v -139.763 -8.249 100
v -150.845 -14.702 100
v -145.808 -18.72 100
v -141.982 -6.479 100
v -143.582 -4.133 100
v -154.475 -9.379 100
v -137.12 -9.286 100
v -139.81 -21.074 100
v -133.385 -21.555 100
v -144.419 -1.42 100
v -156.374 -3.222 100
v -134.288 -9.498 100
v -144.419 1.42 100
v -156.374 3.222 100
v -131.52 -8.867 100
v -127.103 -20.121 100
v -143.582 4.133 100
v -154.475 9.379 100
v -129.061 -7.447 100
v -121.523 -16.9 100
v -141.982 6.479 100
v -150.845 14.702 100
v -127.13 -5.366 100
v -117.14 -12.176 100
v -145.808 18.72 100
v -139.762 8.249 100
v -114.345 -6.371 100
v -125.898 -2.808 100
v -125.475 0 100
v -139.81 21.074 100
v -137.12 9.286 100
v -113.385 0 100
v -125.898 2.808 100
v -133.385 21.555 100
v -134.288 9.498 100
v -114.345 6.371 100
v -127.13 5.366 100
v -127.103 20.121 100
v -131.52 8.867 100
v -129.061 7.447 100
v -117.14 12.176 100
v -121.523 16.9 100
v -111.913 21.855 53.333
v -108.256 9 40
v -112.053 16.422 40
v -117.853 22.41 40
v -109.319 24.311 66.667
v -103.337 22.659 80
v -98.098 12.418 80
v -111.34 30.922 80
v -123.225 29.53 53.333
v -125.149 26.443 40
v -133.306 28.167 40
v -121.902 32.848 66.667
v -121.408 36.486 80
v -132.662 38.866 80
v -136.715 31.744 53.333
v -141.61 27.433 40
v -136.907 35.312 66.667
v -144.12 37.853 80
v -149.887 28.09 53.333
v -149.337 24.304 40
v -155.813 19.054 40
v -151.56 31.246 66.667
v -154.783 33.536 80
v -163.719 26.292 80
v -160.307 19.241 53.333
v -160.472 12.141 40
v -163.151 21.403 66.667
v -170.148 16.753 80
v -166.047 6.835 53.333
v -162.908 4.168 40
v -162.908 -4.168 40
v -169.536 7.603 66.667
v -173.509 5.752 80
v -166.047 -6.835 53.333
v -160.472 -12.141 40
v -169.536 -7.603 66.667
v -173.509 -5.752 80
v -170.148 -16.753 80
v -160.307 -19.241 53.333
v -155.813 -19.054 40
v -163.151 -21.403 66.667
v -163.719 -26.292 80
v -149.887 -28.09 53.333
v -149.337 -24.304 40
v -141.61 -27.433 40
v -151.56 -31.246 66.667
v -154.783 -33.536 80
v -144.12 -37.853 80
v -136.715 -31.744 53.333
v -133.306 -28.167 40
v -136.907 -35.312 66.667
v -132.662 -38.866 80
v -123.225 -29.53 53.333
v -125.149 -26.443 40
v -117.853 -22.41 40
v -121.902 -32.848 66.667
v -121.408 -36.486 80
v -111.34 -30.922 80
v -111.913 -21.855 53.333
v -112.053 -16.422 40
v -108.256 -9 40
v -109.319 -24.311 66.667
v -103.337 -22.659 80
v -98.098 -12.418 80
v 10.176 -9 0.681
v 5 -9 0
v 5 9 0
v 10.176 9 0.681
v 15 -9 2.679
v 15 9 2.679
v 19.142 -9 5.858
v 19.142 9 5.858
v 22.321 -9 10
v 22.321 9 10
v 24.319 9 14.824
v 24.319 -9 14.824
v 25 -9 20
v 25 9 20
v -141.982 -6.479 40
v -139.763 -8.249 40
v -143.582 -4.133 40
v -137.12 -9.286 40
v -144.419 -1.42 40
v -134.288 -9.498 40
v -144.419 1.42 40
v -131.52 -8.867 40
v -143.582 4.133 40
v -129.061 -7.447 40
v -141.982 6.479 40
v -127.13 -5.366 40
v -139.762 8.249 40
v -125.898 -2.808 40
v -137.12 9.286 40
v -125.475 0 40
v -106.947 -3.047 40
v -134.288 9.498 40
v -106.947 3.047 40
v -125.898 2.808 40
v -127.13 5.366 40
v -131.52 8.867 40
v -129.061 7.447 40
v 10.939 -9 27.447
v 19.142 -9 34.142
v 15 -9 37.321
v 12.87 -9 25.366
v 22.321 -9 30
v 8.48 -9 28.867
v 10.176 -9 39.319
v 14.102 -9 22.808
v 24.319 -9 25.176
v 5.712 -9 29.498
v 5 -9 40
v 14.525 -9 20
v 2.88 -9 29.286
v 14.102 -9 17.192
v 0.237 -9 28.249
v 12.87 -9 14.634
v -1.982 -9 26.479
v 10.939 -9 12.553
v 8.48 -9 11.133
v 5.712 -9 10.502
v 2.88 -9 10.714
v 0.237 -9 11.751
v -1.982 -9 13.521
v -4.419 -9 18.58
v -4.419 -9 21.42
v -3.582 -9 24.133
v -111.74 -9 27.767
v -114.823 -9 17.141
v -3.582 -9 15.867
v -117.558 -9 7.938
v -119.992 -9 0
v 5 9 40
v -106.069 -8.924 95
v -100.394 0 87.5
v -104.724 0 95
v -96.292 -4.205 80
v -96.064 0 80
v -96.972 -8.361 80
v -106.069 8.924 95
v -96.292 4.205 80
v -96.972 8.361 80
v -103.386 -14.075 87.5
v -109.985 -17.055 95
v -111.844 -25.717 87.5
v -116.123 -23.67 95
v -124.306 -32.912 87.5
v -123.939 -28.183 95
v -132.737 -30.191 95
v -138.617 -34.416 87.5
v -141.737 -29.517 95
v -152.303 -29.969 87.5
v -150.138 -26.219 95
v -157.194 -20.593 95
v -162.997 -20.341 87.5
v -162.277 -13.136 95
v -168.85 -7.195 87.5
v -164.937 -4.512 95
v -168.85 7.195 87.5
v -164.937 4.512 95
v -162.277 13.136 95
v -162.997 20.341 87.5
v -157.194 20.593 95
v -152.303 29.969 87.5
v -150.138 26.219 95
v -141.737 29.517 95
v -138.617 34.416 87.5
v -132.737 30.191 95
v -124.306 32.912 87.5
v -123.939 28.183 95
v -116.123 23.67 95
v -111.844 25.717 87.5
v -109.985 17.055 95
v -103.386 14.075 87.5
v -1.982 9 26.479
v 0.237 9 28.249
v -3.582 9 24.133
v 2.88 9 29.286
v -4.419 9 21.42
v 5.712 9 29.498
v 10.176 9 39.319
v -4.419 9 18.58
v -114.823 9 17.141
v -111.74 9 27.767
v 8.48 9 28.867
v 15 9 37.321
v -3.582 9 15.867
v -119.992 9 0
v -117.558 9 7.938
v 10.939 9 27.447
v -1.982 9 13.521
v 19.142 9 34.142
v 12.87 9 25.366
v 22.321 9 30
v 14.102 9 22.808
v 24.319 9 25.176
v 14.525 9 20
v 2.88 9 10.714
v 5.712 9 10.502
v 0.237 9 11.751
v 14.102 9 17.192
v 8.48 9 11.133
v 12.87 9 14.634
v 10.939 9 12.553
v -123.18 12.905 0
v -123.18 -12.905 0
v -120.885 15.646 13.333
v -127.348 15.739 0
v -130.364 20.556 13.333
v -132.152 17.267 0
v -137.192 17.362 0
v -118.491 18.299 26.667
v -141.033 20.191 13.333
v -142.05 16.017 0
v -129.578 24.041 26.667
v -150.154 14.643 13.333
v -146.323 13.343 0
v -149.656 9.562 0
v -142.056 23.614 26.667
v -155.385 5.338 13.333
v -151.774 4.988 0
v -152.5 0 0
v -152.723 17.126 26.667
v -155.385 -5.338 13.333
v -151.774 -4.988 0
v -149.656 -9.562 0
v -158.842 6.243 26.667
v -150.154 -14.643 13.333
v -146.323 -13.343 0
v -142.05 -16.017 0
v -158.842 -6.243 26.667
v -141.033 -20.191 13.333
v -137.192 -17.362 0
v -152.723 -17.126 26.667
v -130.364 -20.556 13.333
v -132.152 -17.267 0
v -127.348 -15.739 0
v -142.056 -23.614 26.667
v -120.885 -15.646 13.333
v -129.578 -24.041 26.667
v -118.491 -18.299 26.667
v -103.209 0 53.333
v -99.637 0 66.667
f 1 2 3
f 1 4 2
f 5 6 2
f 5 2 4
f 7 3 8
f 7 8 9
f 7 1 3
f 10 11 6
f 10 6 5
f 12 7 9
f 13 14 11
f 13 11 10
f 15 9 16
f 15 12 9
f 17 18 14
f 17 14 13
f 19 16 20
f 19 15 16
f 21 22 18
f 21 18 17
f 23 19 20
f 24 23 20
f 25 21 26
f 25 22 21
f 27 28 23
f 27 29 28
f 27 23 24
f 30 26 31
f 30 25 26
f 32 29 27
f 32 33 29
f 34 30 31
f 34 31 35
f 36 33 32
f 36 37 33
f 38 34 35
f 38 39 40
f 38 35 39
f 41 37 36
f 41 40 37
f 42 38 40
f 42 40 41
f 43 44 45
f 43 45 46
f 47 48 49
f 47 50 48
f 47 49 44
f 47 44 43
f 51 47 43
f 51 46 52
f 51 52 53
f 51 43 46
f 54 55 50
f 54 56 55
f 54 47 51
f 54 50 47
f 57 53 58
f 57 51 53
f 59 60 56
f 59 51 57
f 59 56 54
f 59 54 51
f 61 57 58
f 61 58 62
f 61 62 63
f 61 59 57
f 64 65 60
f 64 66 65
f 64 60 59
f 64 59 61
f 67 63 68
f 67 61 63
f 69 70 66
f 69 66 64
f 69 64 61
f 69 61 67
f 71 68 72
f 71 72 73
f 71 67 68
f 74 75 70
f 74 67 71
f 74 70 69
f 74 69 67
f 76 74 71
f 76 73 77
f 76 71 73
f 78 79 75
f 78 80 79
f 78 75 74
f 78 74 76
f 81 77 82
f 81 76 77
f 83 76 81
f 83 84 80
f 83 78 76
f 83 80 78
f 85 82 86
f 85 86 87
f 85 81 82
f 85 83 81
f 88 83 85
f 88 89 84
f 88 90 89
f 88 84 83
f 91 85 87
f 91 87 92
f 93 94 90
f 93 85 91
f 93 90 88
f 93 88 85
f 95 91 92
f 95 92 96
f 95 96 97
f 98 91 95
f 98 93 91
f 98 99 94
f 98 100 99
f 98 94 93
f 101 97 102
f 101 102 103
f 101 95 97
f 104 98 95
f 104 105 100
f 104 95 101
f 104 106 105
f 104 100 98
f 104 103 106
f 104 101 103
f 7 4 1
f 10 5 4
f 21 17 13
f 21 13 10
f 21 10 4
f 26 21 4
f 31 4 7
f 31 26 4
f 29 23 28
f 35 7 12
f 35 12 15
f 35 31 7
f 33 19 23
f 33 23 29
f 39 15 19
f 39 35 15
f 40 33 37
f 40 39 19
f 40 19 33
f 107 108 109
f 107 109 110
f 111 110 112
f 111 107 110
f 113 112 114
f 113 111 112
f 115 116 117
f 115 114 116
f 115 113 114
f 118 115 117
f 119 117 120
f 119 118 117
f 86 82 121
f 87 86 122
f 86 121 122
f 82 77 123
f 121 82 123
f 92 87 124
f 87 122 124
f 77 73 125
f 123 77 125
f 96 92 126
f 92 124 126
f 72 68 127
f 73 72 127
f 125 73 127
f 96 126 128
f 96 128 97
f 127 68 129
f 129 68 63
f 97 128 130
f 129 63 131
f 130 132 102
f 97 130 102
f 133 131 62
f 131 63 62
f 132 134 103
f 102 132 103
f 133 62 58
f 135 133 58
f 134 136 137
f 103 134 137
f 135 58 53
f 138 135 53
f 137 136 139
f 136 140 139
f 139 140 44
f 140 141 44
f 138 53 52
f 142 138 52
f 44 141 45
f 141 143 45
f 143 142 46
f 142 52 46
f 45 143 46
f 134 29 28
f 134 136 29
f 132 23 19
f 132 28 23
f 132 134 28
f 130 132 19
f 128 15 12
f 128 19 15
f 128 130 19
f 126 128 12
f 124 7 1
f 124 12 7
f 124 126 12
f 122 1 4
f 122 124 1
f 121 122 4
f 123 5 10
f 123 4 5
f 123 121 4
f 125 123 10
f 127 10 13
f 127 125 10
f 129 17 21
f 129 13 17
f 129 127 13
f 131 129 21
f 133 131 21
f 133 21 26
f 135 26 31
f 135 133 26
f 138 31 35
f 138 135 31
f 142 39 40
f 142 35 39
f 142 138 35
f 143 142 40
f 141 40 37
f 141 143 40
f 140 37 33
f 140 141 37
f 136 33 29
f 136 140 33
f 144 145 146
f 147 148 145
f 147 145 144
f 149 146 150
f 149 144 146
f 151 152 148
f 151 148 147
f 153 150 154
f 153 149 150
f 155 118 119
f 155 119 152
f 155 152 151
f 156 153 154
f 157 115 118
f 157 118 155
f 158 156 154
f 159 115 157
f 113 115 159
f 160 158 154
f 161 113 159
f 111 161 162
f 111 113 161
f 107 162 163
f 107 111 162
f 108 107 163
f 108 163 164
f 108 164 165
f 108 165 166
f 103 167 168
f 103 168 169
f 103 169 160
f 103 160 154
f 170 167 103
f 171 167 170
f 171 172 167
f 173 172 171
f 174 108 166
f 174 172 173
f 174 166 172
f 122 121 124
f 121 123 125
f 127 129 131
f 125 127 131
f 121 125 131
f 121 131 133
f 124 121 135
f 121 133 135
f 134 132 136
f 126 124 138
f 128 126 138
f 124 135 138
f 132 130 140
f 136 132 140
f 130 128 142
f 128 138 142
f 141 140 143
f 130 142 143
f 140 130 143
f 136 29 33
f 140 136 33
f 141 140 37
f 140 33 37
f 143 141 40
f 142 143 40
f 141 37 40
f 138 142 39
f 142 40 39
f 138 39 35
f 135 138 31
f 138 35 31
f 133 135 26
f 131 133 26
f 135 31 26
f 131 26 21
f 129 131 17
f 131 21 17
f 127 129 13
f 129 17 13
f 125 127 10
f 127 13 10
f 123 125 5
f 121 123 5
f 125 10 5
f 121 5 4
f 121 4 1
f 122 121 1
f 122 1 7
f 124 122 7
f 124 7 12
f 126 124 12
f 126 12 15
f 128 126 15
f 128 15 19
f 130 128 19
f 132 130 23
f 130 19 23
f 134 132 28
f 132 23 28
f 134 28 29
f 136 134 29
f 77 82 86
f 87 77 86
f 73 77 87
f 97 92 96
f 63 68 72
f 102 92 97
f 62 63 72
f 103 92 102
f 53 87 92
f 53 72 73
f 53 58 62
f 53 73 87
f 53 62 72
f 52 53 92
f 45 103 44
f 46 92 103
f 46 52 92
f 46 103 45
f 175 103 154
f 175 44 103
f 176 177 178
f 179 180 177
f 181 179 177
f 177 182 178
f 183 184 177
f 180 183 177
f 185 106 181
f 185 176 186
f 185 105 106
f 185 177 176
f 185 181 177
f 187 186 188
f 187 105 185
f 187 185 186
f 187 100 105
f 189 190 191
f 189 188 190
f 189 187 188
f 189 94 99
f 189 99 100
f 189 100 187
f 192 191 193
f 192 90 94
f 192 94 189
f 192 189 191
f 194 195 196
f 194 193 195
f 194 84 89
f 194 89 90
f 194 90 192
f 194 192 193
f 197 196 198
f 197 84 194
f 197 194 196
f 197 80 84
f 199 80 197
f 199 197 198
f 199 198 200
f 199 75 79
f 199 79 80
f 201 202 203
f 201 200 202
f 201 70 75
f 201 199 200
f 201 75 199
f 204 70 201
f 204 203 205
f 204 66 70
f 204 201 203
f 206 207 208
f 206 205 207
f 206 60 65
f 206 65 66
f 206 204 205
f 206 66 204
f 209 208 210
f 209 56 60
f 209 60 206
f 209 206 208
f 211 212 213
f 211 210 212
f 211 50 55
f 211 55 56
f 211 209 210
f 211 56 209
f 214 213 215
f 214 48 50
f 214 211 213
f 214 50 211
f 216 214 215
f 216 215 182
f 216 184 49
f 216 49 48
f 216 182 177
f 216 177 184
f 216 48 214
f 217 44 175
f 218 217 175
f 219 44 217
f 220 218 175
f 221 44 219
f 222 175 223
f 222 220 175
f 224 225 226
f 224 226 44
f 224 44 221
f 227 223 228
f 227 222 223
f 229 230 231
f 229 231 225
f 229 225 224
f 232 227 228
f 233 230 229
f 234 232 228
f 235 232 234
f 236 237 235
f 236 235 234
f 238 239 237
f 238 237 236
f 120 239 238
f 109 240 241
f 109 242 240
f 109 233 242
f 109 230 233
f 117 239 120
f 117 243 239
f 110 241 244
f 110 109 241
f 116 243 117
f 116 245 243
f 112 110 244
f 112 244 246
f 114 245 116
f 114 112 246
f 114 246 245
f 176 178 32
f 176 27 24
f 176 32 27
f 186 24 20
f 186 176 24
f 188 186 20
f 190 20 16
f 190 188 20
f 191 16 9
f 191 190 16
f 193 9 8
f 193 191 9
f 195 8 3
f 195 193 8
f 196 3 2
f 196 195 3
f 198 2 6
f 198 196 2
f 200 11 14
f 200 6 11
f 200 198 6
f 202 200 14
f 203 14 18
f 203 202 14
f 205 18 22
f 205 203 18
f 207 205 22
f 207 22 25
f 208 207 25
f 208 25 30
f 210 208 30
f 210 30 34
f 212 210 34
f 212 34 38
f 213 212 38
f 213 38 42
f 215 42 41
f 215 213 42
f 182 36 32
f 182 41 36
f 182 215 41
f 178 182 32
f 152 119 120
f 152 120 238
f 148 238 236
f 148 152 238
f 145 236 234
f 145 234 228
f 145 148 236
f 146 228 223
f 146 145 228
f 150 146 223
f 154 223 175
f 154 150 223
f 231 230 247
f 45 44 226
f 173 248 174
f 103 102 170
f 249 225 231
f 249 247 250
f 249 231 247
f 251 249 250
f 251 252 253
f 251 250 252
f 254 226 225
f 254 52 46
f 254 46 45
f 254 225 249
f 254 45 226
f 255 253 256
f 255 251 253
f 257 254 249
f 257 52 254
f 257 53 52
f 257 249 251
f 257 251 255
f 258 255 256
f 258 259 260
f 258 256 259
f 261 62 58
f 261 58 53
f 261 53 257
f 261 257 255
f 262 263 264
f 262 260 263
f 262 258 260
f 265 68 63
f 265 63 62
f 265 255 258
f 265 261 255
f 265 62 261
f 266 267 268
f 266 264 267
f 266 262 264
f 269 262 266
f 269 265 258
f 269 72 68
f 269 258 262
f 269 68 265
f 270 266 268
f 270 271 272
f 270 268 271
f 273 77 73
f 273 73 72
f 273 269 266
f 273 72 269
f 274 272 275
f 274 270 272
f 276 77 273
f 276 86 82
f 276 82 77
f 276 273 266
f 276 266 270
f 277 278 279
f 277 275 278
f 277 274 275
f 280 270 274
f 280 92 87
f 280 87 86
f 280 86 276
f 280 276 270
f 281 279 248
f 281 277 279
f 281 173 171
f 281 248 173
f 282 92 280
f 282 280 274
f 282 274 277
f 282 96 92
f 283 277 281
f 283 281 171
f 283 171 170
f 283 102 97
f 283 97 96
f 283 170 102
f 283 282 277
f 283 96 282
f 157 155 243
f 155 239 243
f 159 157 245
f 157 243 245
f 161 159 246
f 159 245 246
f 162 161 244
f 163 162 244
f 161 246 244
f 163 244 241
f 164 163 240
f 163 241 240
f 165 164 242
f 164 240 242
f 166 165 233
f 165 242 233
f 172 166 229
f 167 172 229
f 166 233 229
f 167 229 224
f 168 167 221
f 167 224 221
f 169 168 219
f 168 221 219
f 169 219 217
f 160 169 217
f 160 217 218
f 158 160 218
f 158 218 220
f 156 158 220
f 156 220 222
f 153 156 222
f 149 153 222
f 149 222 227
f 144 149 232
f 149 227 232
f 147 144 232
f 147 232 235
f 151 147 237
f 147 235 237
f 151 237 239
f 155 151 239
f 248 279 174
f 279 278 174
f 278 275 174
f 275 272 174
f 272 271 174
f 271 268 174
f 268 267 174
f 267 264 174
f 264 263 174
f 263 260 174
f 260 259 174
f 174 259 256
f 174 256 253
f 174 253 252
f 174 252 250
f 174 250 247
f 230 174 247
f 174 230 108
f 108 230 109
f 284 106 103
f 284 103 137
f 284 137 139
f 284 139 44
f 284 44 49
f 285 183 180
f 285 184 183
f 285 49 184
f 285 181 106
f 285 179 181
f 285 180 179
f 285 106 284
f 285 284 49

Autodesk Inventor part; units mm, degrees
ref_plane "YZ Plane" through (0, 0, 0) normal (1, 0, 0) x (0, 1, 0)
ref_plane "XZ Plane" through (0, 0, 0) normal (0, 1, 0) x (-1, 0, 0)
ref_plane "XY Plane" through (0, 0, 0) normal (0, 0, 1) x (1, 0, 0)
sketch "Sketch1" plane through (0, 0, 0) normal (0, 0, 1) x (1, 0, 0)
  line L0 (25, -9) -> (-135, -9)
  line L1 (-135, -9) -> (-135, 9)
  line L2 (-135, 9) -> (25, 9)
  line L3 (25, 9) -> (25, -9)
  circle A0 centre (-135, 0) radius 17.5
  point P0 (0, 0)
  dimension "d0" = 160
  dimension "d1" = 18
  dimension "d5" = 35
extrude "Extrusion1" add sketch "Sketch1" along normal blind 40 contours L0 A0 L2 L3 | L0 L1 L2 A0 picked at (-129.1667, 0)
fillet "Fillet1" radius 20 2 edges at (25, 0, 40) (25, 0, 0)
extrude "Extrusion2" add sketch "Sketch1" along normal blind 40 draft 15 contours A0 L2 L1 L0 | L0 L1 L2 A0
sketch "Sketch4" plane through (0, 0, 40) normal (0, 0, 1) x (1, 0, 0)
  line L0 (-108.2558, -9) -> (5, -9) projected
  line L1 (5, 9) -> (5, -9) projected
  line L2 (5, 9) -> (-108.2558, 9) projected
  arc A0 (-108.2558, 9) -> (-108.2558, -9) centre (-135, 0) ccw projected
  circle A1 centre (-135, 0) radius 28.218
  point P0 (0, 0)
extrude "Extrusion3" add sketch "Sketch4" along normal blind 40 draft 15 separate body contours A0 A1
sketch "Sketch5" plane through (-135, 0, 80) normal (0, 0, 1) x (1, 0, 0)
  circle A0 centre (0, 0) radius 38.9359 projected
  point P0 (135, 0)
extrude "Extrusion4" add sketch "Sketch5" along normal blind 15 draft -30 bodies 2
sketch "Sketch6" plane through (-135, 0, 95) normal (0, 0, 1) x (1, 0, 0)
  circle A0 centre (0, 0) radius 30.2757 projected
  point P0 (135, 0)
extrude "Extrusion5" add sketch "Sketch6" along normal blind 5 draft -60 bodies 2
sketch "Sketch7" plane through (-135, 0, 100) normal (0, 0, 1) x (1, 0, 0)
  circle A0 centre (0, 0) radius 21.6154 projected
  circle A1 centre (0, 0) radius 9.525
  point P0 (135, 0)
  dimension "d16" = 19.05
extrude "Extrusion6" cut sketch "Sketch7" against normal blind 90 contours A1 bodies 2
sketch "Sketch8" plane through (0, 0, 40) normal (0, 0, 1) x (1, 0, 0)
  circle A0 centre (-135, 0) radius 9.525 projected
  point P0 (0, 0)
extrude "Extrusion7" add sketch "Sketch8" along normal up to surface (60 mm away) separate body
sketch "Sketch9" plane through (5, 9, 20) normal (0, 1, 0) x (1, 0, 0)
  circle A0 centre (0, 0) radius 9.525
  point P0 (-5, 20)
  dimension "d21" = 19.05
extrude "Extrusion8" cut sketch "Sketch9" against normal through all bodies 1
properties part number "handle"
